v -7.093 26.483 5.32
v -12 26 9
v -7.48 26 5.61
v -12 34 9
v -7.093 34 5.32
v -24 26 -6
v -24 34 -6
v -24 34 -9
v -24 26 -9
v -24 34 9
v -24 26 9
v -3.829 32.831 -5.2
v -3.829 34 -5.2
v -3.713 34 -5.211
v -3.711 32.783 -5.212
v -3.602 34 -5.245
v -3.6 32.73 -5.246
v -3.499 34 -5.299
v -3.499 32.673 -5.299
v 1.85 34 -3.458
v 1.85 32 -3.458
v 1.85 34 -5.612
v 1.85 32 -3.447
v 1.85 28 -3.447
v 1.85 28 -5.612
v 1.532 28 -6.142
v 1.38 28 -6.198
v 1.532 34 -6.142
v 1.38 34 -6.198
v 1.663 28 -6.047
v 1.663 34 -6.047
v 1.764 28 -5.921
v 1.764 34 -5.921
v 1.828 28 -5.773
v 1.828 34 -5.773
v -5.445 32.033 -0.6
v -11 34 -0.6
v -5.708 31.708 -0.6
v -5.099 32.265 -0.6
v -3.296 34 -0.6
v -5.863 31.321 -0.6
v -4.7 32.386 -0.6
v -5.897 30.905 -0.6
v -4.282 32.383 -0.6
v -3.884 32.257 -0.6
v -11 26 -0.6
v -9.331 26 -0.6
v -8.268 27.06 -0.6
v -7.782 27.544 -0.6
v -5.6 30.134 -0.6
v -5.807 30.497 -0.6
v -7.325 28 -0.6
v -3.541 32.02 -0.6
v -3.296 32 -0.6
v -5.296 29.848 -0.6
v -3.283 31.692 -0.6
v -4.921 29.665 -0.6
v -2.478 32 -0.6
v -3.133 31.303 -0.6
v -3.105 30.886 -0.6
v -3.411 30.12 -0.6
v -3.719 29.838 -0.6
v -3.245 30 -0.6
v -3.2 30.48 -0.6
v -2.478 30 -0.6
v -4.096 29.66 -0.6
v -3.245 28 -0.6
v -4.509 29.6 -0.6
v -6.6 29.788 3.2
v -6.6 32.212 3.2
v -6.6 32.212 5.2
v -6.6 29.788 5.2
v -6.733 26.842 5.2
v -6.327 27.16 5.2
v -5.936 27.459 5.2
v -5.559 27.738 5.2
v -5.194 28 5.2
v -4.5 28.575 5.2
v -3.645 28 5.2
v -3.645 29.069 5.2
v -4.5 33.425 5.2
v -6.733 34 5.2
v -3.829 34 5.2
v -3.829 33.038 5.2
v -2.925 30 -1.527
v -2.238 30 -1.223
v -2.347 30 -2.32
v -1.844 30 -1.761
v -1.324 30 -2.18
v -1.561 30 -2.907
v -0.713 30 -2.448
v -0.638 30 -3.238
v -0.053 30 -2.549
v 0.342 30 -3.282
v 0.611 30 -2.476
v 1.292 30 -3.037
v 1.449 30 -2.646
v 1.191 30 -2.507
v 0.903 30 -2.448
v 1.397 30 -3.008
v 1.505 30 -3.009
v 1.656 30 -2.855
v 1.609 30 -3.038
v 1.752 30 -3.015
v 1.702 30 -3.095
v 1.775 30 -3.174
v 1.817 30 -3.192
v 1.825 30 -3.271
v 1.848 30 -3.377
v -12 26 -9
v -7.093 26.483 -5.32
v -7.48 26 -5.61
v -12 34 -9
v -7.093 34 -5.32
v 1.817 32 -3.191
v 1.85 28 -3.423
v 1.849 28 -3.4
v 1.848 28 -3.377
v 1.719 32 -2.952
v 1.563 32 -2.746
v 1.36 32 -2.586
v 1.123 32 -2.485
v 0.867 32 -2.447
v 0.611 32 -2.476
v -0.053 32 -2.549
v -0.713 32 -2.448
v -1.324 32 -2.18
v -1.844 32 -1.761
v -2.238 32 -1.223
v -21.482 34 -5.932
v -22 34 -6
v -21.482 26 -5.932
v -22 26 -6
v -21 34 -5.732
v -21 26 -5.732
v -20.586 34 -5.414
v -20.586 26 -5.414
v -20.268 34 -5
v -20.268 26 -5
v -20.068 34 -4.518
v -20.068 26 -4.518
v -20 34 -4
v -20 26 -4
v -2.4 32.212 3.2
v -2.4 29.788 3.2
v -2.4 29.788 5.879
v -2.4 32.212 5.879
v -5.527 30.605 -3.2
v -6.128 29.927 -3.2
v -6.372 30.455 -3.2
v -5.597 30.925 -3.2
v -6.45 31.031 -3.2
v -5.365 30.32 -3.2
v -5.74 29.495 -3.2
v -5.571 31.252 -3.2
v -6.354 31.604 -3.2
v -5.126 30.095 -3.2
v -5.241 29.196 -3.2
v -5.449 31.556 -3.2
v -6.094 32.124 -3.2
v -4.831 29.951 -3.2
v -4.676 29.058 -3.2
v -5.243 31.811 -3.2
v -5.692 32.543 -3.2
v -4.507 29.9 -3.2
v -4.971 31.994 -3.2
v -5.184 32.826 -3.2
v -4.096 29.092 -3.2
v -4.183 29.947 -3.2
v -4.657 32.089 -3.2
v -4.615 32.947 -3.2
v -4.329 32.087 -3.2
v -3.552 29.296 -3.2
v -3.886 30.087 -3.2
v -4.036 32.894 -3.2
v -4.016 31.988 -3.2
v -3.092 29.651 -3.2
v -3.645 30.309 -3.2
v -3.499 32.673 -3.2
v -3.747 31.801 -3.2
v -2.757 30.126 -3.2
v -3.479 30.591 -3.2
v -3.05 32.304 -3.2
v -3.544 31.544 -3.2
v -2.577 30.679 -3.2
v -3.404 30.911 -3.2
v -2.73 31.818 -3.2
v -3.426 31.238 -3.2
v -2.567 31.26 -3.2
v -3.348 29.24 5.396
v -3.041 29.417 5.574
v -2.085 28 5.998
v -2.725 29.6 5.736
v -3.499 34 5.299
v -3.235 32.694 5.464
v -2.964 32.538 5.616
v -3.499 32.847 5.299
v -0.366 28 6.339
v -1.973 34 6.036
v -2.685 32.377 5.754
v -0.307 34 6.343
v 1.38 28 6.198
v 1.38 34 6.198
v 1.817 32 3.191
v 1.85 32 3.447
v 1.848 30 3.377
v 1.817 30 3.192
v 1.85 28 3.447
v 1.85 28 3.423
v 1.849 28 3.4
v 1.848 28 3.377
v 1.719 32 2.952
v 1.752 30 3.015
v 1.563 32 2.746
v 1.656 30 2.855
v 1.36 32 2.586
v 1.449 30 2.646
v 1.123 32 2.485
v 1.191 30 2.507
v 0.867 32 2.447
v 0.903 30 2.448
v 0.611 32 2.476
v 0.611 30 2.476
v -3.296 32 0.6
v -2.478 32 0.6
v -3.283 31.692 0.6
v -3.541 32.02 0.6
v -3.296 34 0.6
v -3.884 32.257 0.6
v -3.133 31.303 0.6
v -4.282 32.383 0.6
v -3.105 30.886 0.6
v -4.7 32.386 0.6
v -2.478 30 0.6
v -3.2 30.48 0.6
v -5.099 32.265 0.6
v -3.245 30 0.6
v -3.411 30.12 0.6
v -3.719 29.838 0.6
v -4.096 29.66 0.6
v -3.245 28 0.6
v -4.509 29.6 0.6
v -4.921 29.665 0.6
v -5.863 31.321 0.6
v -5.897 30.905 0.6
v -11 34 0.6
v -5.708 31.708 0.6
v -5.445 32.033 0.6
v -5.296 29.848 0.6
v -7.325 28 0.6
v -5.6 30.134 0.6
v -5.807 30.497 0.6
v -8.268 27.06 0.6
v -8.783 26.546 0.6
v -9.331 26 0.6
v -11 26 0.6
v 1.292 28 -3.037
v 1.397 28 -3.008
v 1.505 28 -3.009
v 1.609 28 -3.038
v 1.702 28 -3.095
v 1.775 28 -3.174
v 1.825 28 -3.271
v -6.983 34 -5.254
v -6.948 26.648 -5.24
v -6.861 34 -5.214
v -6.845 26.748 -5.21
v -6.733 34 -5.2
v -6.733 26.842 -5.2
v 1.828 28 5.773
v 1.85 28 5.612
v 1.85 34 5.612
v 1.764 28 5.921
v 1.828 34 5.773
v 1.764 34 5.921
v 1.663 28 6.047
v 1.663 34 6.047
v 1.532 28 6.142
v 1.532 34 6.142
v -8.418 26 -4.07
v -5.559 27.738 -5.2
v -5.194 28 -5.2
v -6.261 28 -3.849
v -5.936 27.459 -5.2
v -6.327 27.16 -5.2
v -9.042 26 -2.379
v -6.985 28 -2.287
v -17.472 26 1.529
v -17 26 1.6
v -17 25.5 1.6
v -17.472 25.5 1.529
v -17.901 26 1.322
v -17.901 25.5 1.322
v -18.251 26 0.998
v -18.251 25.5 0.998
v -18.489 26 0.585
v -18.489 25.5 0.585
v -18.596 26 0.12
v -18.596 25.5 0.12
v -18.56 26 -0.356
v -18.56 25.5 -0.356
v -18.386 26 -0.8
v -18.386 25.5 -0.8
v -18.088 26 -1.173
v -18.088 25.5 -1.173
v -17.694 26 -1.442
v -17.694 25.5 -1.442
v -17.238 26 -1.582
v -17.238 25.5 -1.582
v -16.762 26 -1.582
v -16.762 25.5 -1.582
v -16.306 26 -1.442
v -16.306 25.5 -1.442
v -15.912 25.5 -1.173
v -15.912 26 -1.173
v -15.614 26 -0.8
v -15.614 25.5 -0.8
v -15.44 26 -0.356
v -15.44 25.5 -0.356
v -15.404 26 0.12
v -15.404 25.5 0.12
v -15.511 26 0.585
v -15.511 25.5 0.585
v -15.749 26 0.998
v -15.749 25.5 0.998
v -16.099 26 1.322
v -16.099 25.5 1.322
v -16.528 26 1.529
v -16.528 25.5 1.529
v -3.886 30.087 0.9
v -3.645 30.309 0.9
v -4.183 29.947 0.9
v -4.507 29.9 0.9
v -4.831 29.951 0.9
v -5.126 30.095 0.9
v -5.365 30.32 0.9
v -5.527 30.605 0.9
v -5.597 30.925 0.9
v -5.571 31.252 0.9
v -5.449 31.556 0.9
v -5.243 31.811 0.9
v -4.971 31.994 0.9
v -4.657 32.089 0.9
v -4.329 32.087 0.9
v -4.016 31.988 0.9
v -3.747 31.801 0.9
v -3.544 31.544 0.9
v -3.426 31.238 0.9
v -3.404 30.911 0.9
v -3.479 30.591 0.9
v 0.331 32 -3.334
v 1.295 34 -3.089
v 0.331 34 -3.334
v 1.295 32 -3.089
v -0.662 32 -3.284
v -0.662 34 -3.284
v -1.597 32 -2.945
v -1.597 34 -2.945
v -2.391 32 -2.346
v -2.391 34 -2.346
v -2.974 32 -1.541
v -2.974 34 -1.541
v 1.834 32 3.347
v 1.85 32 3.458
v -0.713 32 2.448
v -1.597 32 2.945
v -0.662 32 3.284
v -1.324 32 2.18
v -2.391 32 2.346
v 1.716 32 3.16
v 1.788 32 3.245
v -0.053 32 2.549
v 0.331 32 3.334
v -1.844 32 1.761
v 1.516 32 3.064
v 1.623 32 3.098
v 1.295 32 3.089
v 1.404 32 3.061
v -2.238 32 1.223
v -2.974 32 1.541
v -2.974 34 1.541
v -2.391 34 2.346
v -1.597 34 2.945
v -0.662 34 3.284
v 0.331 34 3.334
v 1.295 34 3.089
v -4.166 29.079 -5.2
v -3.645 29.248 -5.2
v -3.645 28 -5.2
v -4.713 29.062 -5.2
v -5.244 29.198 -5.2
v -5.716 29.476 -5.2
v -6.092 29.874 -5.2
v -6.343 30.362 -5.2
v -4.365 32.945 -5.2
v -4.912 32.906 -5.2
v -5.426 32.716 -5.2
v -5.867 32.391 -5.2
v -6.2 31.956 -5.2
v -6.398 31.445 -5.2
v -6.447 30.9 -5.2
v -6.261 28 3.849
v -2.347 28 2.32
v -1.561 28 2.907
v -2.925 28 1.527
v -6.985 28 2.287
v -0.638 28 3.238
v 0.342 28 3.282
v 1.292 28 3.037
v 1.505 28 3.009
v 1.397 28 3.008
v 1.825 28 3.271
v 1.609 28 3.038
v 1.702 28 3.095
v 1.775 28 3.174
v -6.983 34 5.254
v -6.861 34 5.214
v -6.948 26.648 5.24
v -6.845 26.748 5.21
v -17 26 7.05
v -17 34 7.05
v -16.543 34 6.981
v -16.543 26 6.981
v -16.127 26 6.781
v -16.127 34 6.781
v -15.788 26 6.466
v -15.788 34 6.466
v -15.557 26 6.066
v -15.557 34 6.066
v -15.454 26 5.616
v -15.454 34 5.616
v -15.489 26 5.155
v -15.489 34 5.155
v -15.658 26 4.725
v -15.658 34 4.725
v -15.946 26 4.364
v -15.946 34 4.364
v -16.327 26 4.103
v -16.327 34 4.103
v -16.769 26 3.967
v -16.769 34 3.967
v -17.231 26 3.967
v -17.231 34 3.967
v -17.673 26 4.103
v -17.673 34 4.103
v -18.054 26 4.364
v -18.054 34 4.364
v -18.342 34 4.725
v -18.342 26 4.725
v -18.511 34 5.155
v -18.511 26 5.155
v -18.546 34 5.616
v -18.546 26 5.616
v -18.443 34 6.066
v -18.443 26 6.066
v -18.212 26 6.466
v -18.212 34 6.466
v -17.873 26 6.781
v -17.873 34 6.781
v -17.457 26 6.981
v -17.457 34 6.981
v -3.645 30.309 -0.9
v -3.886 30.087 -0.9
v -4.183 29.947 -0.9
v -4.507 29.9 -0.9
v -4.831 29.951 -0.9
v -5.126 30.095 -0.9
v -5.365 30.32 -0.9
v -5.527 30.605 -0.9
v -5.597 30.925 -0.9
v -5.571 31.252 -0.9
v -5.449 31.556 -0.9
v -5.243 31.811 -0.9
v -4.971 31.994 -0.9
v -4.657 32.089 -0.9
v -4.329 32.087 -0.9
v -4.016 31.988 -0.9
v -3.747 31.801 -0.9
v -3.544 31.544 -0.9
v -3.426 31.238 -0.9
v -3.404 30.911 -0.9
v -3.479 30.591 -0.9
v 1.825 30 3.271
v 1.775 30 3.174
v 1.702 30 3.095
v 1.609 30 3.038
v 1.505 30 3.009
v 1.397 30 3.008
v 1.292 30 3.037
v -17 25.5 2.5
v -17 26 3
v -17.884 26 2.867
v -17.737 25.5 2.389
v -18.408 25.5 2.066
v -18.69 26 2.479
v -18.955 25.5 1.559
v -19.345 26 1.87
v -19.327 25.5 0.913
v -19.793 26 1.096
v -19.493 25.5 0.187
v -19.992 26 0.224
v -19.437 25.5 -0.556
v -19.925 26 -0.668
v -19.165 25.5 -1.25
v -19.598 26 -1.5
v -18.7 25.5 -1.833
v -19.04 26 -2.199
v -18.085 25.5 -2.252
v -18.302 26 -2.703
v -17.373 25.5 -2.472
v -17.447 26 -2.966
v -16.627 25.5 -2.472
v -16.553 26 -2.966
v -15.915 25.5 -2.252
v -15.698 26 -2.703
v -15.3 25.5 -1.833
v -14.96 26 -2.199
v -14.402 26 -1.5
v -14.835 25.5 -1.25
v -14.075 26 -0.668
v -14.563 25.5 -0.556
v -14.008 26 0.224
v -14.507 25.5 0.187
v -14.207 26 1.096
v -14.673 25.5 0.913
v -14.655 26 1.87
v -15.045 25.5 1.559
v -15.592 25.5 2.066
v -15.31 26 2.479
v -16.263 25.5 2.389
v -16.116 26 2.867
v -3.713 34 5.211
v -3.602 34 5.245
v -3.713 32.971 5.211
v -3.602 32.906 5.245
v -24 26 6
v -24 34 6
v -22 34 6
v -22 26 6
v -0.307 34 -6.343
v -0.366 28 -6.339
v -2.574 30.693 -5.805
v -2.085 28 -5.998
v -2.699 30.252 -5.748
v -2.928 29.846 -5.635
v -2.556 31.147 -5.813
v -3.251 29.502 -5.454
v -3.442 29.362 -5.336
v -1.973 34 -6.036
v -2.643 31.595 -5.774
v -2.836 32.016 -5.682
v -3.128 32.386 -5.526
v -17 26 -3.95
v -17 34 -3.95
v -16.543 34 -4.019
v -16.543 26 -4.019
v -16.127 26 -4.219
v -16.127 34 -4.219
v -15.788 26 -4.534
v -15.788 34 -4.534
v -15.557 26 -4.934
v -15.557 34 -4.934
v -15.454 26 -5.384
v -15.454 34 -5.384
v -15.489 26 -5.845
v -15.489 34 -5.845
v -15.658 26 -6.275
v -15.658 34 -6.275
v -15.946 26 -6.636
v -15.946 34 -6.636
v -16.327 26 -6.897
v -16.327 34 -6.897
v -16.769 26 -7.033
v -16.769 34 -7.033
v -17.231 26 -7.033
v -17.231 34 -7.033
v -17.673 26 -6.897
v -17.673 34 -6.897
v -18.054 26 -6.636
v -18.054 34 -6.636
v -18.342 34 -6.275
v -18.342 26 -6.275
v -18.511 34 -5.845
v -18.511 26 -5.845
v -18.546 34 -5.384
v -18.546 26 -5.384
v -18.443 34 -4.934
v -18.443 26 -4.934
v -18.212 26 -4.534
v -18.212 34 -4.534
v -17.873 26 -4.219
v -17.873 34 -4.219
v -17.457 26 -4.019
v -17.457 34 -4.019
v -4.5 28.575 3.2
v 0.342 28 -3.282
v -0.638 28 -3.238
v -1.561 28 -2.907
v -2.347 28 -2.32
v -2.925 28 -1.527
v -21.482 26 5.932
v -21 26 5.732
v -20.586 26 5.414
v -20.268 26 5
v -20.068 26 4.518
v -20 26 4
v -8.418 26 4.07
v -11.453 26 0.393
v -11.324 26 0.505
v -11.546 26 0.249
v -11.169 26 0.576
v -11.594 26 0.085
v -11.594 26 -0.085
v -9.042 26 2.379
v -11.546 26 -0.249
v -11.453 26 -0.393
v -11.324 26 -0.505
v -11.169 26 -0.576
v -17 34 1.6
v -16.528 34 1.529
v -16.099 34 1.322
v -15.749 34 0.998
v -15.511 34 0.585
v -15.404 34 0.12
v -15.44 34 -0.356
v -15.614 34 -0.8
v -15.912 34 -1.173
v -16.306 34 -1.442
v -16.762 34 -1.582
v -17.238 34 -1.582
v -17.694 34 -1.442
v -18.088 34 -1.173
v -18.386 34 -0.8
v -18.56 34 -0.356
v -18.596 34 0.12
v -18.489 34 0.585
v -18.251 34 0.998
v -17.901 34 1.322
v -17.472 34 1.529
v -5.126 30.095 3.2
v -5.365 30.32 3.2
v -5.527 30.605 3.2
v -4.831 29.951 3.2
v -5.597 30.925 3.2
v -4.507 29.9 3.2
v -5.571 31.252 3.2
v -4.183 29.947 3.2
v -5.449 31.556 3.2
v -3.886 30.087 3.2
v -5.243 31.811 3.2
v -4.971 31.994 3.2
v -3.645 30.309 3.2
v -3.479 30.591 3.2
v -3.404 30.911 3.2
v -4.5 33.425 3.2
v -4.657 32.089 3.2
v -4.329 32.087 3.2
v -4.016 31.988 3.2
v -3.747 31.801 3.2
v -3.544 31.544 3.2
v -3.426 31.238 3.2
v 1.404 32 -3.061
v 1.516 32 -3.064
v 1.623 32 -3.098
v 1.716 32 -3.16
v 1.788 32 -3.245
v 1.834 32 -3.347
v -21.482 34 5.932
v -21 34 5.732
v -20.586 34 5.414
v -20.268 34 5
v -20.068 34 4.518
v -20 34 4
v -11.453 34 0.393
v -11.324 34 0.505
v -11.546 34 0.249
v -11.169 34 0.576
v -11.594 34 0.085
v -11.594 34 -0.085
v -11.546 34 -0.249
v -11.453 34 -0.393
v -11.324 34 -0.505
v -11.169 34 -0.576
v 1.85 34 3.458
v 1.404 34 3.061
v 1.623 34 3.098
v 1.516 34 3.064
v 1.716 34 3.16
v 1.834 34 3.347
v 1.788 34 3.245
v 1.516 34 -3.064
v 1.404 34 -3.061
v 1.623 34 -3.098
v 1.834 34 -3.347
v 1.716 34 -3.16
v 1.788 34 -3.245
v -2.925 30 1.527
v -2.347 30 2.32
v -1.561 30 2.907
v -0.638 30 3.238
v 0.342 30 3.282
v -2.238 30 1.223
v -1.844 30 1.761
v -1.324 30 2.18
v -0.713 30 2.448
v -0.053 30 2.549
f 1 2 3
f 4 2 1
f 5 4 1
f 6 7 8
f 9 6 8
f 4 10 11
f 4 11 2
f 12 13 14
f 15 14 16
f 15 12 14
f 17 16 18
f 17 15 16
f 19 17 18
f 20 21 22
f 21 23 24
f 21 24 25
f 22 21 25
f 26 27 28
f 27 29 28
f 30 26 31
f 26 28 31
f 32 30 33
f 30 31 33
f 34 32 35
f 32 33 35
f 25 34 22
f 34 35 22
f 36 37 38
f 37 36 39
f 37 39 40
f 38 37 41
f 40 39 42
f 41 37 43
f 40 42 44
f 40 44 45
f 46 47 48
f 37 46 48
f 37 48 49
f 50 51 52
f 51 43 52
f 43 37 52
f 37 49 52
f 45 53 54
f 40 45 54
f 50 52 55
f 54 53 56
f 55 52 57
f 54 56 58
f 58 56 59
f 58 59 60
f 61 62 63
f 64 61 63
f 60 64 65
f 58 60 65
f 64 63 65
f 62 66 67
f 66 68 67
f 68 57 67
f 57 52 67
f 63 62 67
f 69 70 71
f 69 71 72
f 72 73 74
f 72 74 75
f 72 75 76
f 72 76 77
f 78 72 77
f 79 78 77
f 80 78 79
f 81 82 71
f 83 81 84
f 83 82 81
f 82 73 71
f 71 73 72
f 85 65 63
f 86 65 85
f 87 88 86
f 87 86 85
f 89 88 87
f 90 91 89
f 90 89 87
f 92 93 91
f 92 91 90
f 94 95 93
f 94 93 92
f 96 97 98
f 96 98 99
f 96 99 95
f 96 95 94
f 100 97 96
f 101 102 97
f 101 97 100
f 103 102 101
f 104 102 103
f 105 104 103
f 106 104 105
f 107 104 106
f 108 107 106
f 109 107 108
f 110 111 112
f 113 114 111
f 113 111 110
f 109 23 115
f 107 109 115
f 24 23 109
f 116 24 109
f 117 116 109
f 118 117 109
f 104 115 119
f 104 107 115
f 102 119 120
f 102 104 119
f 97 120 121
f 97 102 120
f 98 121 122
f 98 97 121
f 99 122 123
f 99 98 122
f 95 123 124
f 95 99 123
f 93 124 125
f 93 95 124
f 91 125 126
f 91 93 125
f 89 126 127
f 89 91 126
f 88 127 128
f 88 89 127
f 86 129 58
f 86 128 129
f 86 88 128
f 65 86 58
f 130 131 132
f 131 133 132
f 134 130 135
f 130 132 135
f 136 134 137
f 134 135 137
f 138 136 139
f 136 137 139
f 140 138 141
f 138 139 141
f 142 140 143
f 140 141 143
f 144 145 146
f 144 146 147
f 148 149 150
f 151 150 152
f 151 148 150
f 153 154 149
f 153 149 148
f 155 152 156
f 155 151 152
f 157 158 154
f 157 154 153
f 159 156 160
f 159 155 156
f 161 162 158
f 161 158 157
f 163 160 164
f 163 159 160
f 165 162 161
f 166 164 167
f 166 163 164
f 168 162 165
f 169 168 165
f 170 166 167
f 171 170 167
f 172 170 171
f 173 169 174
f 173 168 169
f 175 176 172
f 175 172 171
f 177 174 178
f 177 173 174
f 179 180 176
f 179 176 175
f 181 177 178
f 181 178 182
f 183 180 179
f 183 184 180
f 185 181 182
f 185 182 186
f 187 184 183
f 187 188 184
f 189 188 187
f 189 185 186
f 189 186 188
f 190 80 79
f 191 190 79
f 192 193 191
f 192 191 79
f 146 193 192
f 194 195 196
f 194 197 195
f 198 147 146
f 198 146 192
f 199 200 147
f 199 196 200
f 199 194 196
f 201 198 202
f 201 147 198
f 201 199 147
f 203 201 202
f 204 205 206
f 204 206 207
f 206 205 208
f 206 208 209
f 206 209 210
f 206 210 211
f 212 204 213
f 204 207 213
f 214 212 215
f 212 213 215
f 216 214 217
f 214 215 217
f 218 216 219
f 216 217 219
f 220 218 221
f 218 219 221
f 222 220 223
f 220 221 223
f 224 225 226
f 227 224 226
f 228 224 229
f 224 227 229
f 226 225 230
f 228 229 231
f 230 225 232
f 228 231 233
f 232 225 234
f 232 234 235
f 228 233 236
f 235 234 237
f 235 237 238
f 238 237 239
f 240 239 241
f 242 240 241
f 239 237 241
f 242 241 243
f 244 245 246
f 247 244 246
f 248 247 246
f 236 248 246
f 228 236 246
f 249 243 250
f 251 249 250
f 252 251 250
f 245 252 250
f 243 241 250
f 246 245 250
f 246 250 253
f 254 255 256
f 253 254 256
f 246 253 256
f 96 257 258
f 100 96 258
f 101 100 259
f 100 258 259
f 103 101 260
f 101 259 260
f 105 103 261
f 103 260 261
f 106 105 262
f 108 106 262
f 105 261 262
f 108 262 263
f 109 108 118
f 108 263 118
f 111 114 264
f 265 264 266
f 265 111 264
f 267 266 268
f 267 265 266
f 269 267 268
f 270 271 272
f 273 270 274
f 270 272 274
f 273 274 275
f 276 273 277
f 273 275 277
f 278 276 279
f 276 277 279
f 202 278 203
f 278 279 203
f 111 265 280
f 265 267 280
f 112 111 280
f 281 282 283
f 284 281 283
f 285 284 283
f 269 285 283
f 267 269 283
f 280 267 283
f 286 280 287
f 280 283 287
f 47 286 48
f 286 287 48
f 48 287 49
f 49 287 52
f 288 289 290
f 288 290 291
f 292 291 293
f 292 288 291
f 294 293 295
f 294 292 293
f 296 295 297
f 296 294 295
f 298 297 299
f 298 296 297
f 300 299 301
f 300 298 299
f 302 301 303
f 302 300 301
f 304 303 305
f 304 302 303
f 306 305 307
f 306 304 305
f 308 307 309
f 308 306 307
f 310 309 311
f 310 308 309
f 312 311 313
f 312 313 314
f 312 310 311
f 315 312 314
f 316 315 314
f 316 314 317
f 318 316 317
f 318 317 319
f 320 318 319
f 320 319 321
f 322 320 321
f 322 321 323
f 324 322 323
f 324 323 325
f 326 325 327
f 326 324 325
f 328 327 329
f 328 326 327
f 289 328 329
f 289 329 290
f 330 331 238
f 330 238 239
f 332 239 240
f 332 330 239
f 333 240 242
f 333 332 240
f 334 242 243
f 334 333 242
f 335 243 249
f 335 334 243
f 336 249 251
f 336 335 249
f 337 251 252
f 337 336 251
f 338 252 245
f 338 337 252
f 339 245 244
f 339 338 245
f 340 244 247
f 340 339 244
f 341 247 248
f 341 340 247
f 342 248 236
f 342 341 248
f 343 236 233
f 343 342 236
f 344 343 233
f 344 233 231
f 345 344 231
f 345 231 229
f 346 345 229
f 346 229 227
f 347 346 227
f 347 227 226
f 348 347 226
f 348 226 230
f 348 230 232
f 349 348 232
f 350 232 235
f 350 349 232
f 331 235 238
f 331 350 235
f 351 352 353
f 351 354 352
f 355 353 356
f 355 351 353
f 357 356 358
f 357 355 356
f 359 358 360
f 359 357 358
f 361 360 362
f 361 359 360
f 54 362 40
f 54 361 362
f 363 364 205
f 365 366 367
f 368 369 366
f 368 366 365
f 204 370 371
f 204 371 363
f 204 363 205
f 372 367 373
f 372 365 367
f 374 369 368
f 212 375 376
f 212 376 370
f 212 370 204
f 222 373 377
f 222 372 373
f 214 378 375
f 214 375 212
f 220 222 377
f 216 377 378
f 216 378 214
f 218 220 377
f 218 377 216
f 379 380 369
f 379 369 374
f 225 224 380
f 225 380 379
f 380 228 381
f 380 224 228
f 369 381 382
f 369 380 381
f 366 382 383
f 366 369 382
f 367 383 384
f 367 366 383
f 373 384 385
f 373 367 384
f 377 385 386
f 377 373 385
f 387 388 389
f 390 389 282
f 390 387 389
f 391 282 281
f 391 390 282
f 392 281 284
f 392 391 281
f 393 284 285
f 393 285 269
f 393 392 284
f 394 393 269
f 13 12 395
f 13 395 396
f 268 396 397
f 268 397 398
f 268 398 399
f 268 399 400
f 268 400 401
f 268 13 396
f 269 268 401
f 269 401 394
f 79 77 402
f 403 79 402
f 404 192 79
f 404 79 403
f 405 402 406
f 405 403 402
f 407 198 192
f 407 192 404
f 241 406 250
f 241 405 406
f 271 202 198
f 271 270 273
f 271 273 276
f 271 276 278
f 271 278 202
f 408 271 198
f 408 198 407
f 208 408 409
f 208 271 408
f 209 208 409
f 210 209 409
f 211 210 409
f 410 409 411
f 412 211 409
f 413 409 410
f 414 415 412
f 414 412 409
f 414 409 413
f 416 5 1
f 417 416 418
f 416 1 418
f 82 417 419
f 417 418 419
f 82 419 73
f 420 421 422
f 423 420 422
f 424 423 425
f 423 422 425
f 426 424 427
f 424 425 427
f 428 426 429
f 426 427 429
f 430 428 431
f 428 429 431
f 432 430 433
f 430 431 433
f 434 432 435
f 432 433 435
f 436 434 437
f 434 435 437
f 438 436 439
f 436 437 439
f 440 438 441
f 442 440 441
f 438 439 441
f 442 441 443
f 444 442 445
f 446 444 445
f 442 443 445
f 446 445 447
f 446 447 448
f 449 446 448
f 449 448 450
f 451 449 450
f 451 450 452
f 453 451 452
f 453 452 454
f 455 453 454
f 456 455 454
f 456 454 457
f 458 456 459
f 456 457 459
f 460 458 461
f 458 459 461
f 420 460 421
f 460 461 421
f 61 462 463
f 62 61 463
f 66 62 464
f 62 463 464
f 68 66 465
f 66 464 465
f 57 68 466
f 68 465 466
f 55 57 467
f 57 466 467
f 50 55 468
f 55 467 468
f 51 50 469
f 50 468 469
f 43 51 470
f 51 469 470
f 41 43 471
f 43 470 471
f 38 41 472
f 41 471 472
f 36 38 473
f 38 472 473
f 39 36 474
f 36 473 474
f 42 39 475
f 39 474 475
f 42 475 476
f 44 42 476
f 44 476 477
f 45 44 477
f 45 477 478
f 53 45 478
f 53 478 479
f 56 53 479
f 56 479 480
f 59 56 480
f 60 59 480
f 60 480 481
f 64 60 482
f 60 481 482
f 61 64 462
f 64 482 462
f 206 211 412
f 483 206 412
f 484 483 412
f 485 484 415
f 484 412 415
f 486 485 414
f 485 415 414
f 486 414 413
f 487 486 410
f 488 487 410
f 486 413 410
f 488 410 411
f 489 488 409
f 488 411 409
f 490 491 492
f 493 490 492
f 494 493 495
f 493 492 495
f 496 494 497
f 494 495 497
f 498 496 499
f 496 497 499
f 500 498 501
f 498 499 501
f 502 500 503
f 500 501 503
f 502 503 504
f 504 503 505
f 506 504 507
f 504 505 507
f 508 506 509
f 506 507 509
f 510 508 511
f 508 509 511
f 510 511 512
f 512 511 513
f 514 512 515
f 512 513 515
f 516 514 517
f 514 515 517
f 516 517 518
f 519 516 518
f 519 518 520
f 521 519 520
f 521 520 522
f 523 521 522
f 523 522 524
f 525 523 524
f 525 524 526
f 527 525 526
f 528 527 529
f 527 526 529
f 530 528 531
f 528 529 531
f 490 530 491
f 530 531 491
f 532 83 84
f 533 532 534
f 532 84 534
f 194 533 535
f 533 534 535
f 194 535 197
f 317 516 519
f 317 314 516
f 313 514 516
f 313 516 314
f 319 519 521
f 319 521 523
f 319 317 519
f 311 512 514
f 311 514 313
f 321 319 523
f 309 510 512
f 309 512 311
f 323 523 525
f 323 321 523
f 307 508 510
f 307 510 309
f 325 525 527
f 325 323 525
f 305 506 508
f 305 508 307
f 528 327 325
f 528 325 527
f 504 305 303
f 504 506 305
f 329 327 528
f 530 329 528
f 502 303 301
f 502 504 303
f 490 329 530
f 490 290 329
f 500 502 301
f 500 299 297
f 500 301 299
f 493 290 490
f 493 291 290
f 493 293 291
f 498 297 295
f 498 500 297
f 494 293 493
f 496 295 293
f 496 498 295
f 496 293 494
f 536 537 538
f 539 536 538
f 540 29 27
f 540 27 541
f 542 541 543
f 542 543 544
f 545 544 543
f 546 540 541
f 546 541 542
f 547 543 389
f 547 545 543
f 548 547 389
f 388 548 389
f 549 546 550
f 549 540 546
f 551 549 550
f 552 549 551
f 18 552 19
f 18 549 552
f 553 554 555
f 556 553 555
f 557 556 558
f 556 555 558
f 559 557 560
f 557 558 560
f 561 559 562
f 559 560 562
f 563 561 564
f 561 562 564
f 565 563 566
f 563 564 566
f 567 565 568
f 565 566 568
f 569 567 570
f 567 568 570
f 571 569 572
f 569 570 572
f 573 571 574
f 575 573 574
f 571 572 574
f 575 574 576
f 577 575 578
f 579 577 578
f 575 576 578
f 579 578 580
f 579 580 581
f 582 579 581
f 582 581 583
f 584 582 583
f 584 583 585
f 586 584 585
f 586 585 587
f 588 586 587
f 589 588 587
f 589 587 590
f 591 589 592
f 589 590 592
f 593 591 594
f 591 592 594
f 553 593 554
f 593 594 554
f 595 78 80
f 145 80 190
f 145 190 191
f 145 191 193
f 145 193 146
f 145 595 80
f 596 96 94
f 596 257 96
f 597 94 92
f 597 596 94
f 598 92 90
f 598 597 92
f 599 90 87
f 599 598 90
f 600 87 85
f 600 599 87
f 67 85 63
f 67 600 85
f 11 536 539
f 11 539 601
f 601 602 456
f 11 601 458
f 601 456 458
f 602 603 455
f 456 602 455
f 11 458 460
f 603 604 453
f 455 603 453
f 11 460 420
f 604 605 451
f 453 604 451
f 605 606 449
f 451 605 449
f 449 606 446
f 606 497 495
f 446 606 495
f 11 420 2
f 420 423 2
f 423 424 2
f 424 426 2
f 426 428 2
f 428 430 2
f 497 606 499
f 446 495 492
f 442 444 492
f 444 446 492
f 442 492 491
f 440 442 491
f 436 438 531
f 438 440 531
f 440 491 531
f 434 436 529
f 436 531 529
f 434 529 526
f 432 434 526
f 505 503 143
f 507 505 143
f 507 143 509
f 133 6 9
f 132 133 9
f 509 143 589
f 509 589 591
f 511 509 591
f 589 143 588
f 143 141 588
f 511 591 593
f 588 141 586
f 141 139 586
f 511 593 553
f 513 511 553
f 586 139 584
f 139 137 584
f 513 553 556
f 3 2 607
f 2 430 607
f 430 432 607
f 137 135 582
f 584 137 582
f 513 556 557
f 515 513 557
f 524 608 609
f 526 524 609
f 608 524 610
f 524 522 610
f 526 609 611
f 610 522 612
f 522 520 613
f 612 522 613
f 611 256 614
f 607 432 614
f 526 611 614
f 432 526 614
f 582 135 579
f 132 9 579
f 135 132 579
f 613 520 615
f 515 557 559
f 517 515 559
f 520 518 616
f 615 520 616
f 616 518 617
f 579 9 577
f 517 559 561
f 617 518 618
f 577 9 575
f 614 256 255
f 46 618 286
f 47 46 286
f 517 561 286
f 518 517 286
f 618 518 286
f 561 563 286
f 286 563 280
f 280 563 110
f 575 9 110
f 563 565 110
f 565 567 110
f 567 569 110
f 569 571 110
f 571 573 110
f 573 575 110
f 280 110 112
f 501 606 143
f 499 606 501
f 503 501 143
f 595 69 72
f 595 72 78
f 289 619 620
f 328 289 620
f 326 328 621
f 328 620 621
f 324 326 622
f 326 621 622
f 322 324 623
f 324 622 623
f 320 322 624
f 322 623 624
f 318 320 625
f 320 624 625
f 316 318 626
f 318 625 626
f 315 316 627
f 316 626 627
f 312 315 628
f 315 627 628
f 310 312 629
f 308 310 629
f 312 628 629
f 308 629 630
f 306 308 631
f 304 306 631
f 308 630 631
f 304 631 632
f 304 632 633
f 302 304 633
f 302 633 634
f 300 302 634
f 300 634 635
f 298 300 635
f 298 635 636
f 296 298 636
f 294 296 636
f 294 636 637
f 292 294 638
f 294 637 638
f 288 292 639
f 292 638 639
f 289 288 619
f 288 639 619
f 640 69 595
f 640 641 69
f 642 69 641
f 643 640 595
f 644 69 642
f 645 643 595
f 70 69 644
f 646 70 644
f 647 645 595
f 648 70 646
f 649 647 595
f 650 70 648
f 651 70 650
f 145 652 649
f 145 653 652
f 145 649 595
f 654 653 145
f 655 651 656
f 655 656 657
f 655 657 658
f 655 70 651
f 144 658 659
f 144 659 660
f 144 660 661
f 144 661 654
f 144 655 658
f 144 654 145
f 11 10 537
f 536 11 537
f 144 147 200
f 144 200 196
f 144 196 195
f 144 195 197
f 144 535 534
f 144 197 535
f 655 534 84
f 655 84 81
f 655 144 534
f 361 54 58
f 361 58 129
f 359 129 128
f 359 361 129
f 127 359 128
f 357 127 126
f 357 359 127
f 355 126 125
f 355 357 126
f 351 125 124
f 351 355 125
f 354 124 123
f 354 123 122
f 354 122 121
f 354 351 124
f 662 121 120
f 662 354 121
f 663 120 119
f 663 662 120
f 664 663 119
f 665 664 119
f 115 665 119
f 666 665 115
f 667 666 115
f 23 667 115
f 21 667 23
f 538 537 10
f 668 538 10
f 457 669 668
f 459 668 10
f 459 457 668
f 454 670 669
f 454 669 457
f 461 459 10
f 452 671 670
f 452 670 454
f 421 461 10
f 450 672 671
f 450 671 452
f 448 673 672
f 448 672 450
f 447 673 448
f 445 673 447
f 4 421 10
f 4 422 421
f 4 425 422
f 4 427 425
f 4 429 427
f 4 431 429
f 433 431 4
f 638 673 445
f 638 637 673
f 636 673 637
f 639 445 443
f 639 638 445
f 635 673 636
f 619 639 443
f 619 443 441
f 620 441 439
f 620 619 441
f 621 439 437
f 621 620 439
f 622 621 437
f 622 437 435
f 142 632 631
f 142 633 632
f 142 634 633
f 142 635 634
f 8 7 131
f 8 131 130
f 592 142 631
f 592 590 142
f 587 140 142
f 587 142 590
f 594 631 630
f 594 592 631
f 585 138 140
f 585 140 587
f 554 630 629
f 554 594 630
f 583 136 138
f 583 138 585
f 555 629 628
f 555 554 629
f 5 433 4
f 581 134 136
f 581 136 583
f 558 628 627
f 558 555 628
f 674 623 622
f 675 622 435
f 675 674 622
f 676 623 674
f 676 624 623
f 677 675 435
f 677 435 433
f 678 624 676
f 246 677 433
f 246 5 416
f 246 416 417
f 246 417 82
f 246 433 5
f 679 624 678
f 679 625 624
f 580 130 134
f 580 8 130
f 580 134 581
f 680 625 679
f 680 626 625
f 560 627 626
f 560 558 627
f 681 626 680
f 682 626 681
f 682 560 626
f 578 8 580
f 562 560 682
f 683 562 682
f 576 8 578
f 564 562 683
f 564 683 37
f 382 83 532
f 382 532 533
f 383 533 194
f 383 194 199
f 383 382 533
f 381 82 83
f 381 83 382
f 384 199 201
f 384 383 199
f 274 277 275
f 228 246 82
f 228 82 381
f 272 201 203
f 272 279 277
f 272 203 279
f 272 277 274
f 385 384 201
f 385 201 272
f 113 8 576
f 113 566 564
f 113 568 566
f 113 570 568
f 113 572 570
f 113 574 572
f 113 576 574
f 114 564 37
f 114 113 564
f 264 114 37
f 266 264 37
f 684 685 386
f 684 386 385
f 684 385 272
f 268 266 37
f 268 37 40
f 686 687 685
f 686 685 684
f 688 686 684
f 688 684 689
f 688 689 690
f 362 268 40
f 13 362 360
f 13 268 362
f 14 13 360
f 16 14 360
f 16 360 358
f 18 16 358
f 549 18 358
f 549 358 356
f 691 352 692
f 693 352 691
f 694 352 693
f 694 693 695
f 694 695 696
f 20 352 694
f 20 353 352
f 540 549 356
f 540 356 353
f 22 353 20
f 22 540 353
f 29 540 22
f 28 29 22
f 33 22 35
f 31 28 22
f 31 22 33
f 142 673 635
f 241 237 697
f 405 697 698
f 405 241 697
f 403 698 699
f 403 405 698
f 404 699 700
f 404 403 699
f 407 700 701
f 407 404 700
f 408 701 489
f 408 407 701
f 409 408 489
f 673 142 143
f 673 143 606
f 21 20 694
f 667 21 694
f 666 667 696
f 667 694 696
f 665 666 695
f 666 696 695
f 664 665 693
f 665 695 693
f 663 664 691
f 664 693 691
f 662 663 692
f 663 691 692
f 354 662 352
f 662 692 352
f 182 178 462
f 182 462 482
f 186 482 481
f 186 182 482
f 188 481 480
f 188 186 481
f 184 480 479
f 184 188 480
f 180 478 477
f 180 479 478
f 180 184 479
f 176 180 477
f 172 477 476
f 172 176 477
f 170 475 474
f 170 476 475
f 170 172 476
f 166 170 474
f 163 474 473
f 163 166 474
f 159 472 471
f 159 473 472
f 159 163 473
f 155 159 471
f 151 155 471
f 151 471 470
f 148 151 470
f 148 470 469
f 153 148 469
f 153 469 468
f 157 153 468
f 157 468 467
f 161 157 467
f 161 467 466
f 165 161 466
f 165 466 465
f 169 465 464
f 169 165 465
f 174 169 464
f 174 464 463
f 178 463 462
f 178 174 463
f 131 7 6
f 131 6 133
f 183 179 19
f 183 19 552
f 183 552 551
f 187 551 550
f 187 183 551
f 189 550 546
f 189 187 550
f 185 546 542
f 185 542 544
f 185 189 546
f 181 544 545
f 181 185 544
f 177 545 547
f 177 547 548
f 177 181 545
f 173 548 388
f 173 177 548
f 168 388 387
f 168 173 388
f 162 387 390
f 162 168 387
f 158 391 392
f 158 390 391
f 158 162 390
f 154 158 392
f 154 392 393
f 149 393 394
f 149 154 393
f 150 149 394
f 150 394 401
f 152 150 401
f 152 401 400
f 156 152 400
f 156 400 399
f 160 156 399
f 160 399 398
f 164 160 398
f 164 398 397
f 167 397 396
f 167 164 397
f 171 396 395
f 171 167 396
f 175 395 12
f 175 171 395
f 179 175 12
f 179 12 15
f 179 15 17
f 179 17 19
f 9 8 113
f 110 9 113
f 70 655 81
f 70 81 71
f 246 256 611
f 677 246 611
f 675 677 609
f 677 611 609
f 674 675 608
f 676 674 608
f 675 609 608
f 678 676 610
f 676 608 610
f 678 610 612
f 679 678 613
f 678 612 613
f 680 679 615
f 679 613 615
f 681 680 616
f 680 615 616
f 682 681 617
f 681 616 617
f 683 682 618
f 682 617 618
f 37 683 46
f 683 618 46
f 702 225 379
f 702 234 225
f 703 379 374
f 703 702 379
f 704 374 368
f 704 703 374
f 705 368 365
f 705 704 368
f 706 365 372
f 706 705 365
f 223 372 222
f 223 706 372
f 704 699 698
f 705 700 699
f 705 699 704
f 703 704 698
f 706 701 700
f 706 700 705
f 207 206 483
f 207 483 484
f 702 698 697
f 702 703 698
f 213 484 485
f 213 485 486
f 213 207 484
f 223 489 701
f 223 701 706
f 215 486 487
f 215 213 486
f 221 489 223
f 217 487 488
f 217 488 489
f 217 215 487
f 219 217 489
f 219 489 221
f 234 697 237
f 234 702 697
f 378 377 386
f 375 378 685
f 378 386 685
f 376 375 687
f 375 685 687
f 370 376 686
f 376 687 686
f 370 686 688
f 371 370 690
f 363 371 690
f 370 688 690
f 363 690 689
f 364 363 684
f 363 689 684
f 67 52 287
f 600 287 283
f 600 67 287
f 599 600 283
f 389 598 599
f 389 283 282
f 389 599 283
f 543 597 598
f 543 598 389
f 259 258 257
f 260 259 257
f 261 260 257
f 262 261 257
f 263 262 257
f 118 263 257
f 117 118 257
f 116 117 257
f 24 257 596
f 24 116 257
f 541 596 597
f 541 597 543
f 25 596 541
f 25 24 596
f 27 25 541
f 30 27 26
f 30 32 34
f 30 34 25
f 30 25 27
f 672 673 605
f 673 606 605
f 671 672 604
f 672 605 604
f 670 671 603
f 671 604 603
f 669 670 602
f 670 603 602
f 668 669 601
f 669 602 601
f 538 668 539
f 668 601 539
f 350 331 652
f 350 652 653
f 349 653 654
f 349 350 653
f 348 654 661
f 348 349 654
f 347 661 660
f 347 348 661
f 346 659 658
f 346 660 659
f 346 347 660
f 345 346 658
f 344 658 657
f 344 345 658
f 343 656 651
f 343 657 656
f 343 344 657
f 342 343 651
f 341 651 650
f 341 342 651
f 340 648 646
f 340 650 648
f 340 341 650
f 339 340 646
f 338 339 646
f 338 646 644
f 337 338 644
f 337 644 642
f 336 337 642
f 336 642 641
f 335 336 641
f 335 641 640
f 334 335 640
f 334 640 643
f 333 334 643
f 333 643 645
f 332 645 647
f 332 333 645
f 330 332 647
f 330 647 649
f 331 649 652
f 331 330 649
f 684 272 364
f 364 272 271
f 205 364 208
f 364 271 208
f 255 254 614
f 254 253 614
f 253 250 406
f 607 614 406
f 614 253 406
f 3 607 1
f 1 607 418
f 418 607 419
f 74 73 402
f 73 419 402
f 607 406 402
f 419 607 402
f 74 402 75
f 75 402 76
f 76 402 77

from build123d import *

# Parameters (mm, degrees)
SKETCH2_W               = 4
SKETCH2_H               = 3
SKETCH2_R               = 1.55
SKETCH2_R_2             = 1.6
BOSS_EXTRUDE1_DEPTH     = 8
SKETCH3_W               = 8.237002406
SKETCH3_H               = 20.610649192
CUT_EXTRUDE1_DEPTH      = 43.579337712
CHAMFER1_SIZE           = 3
FILLET4_R               = 1
FILLET5_R               = 0.4
FILLET6_R               = 2
CUT_EXTRUDE2_DEPTH      = 43.579337712
SKETCH7_R               = 2.5
SKETCH7_R_2             = 1.6
BOSS_EXTRUDE2_DEPTH     = 0.5
CHAMFER2_SIZE           = 0.5
CUT_EXTRUDE4_DEPTH      = 43.579337712
CUT_EXTRUDE4_DEPTH_BACK = 43.579337712
SKETCH8_R               = 1.1
FILLET7_R               = 0.6
CHAMFER3_SIZE           = 0.3
CUT_EXTRUDE5_DEPTH      = 1.2
CUT_EXTRUDE5_DEPTH_BACK = 2
CUT_EXTRUDE6_DEPTH      = 10
CUT_EXTRUDE6_DEPTH_BACK = 2
SKETCH11_R              = 1.95


# Some blends are built 0.0001 mm under size
with BuildPart() as part:
    # Sketch1 → Revolve1 (revolve)
    with BuildSketch(Plane.XY, mode=Mode.PRIVATE) as revolve1_sk:
        Polygon((-3.35, 34), (-3.35, 32), (-2.55, 32), (-2.55, 30), (-3.3, 30), (-3.3, 28), (-6.35, 28), (-6.35, 34), align=None)
    revolve(revolve1_sk.sketch.rotate(Axis((0, 0, 0), (0, 1, 0)), 270), axis=Axis((0, 0, 0), (0, 1, 0)))

    # Sketch2 → Boss-Extrude1 (add)
    # profile 1 of 6: a face of its own
    with BuildSketch(Plane(origin=(0, 34, 0), x_dir=(1, 0, 0), z_dir=(0, 1, 0))):
        with Locations((-22, 7.5)):
            Rectangle(SKETCH2_W, SKETCH2_H)
    # profile 2 of 6: a face of its own
    with BuildSketch(Plane(origin=(0, 34, 0), x_dir=(1, 0, 0), z_dir=(0, 1, 0))):
        with Locations((-22, -7.5)):
            Rectangle(SKETCH2_W, SKETCH2_H)
    # profile 3 of 6: a face of its own
    with BuildSketch(Plane(origin=(0, 34, 0), x_dir=(1, 0, 0), z_dir=(0, 1, 0))):
        Polygon((-12, 9), (-20, 9), (-20, 6), (-20, -6), (-20, -9), (-12, -9), (-6.933333333, -5.2), (-8.990544831, -5.2), (-8.990544831, 5.2), (-6.933333333, 5.2), align=None)
        with Locations(Location((-17, -5.5, 0), (0, 0, 270))):
            Circle(SKETCH2_R, mode=Mode.SUBTRACT)
        with Locations(Location((-17, 0, 0), (0, 0, 270))):
            Circle(SKETCH2_R_2, mode=Mode.SUBTRACT)
        with Locations(Location((-17, 5.5, 0), (0, 0, 270))):
            Circle(SKETCH2_R, mode=Mode.SUBTRACT)
    # profile 4 of 6: a face of its own
    with BuildSketch(Plane(origin=(0, 34, 0), x_dir=(1, 0, 0), z_dir=(0, 1, 0))):
        with BuildLine():
            Line((-5.08, 3.81), (-6.933333333, 5.2))
            Line((-6.933333333, 5.2), (-8.990544831, 5.2))
            Line((-8.990544831, 5.2), (-8.990544831, -5.2))
            Line((-8.990544831, -5.2), (-6.933333333, -5.2))
            Line((-6.933333333, -5.2), (-5.08, -3.81))
            ThreePointArc((-5.08, -3.81), (-6.35, 0), (-5.08, 3.81))
        make_face()
    # profile 5 of 6: a face of its own
    with BuildSketch(Plane(origin=(0, 34, 0), x_dir=(1, 0, 0), z_dir=(0, 1, 0))):
        with BuildLine():
            Line((-3.644516429, 5.2), (-6.933333333, 5.2))
            Line((-6.933333333, 5.2), (-5.08, 3.81))
            ThreePointArc((-5.08, 3.81), (-4.417275374, 4.561817431), (-3.644516429, 5.2))
        make_face()
    # profile 6 of 6: a face of its own
    with BuildSketch(Plane(origin=(0, 34, 0), x_dir=(1, 0, 0), z_dir=(0, 1, 0))):
        with BuildLine():
            ThreePointArc((-3.644516429, -5.2), (-4.417275374, -4.561817431), (-5.08, -3.81))
            Line((-5.08, -3.81), (-6.933333333, -5.2))
            Line((-6.933333333, -5.2), (-3.644516429, -5.2))
        make_face()
    extrude(amount=-BOSS_EXTRUDE1_DEPTH)

    # Sketch3 → Cut-Extrude1 (cut, through all)
    with BuildSketch(Plane(origin=(0, 0, 0), x_dir=(1, 0, 0), z_dir=(0, 1, 0))):
        with Locations((5.968501203, -0.12700224)):
            Rectangle(SKETCH3_W, SKETCH3_H)
    extrude(amount=CUT_EXTRUDE1_DEPTH, mode=Mode.SUBTRACT)

    # Chamfer1
    # the kernel refuses this chamfer: 3 mm, written as the material it adds along each edge
    # the kernel refuses this chamfer: 3 mm, written as the material it takes off along each edge
    with BuildSketch(Plane(origin=(0, 26, 0), x_dir=(0.568258769278242, 0, -0.8228499080259886), z_dir=(0.8228499080259886, 0, 0.568258769278242))) as chamfer1_2_piece_1_section:
        Polygon((6.35 + CHAMFER1_SIZE, 0), (6.35, CHAMFER1_SIZE), (6.35, 0), align=None)
    chamfer1_2_piece_1 = revolve(axis=Axis((0, 26, 0), (0, 1, 0)), revolution_arc=249.257786961, mode=Mode.PRIVATE)
    chamfer1_2_piece_1 = split(chamfer1_2_piece_1, bisect_by=Plane(origin=(-8.355666821, 28, 0), z_dir=(0, -1, 0)), keep=Keep.TOP, mode=Mode.PRIVATE)
    add(chamfer1_2_piece_1, mode=Mode.SUBTRACT)

    # Fillet4
    fillet4_edges = [part.edges().sort_by_distance(p)[0] for p in [
        (1.85, 31, 1.754992877),
        (1.85, 31, -1.754992877),
    ]]
    fillet(fillet4_edges, radius=FILLET4_R)

    # Fillet5
    # the kernel refuses this fillet: 0.4 mm, written as the material it takes off along each edge
    with BuildSketch(Plane(origin=(1.684476075, 35.466182436, -2.895693415), x_dir=(-0.8951889914868396, 0, -0.4456867392247326), z_dir=(0, -1, 0))) as fillet5_piece_1:
        with BuildLine():
            CenterArc((0.460657077, 0.399157196), FILLET5_R, 153.532715484, 112.747248008)
            Line((0.10258148, 0.577431892), (0.06677392, 0.595259361))
            ThreePointArc((0.06677392, 0.595259361), (0.061610325, 0.584887966), (-0.039704275, -0.00485495))
            Line((-0.039704275, -0.00485495), (0.002595251, -0.03991572))
            ThreePointArc((0.002595251, -0.03991572), (0.217352283, -0.032941517), (0.432109314, -0.03991572))
            Line((0.432109314, -0.03991572), (0.434704565, 0))
        make_face()
    extrude(amount=3.466182436, mode=Mode.SUBTRACT)
    with BuildSketch(Plane(origin=(1.655788422, 26.609524103, -2.85453406), x_dir=(0.3447573093533237, 0, -0.938691854469536), z_dir=(0, 1, 0))) as fillet5_piece_2:
        with BuildLine():
            CenterArc((0.444952287, 0.384221409), FILLET5_R, 177.1195622, 109.026989702)
            ThreePointArc((0.045457658, 0.404322189), (0.028966063, 0.201459847), (0, 0))
            ThreePointArc((0, 0), (0.278095179, -0.039446477), (0.556190359, 0))
        make_face()
    extrude(amount=3.390475897, mode=Mode.SUBTRACT)
    with BuildSketch(Plane(origin=(1.655788422, 26.609524103, 2.85453406), x_dir=(0.3447573093533235, 0, 0.9386918544695363), z_dir=(0, 1, 0))) as fillet5_piece_3:
        with BuildLine():
            CenterArc((0.444952287, -0.384221409), FILLET5_R, 73.853448098, 109.026989702)
            ThreePointArc((0.045457658, -0.404322189), (0.028966063, -0.201459847), (0, 0))
            ThreePointArc((0, 0), (0.278095179, 0.039446477), (0.556190359, 0))
        make_face()
    extrude(amount=3.390475897, mode=Mode.SUBTRACT)
    with BuildSketch(Plane(origin=(1.684476075, 35.466182436, 2.895693415), x_dir=(-0.8951889914868395, 0, 0.44568673922473334), z_dir=(0, -1, 0))) as fillet5_piece_4:
        with BuildLine():
            CenterArc((0.460657077, -0.399157196), FILLET5_R, 93.720036508, 112.747248008)
            Line((0.10258148, -0.577431892), (0.06677392, -0.595259361))
            ThreePointArc((0.06677392, -0.595259361), (0.061610325, -0.584887966), (-0.039704275, 0.00485495))
            Line((-0.039704275, 0.00485495), (0.002595251, 0.03991572))
            ThreePointArc((0.002595251, 0.03991572), (0.217352283, 0.032941517), (0.432109314, 0.03991572))
            Line((0.432109314, 0.03991572), (0.434704565, 0))
        make_face()
    extrude(amount=3.466182436, mode=Mode.SUBTRACT)

    # Fillet6
    fillet6_edges = [part.edges().sort_by_distance(p)[0] for p in [
        (-20, 30, 6),
        (-20, 30, -6),
    ]]
    fillet(fillet6_edges, radius=FILLET6_R)

    # Sketch5 → Cut-Extrude2 (cut, through all)
    with BuildSketch(Plane(origin=(0, 0, 0), x_dir=(1, 0, 0), z_dir=(0, 1, 0))):
        with BuildLine():
            Line((0, -0.6), (-11, -0.6))
            ThreePointArc((-11, -0.6), (-11.6, 0), (-11, 0.6))
            Line((-11, 0.6), (0, 0.6))
            ThreePointArc((0, 0.6), (0.6, 0), (0, -0.6))
        make_face()
    extrude(amount=CUT_EXTRUDE2_DEPTH, mode=Mode.SUBTRACT)

    # Sketch7 → Boss-Extrude2 (add)
    with BuildSketch(Plane.XZ.offset(-26)):
        with Locations(Location((-17, 0, 0), (0, 0, 90))):
            Circle(SKETCH7_R)
        with Locations(Location((-17, 0, 0), (0, 0, 90))):
            Circle(SKETCH7_R_2, mode=Mode.SUBTRACT)
    extrude(amount=BOSS_EXTRUDE2_DEPTH)

    # Chamfer2
    chamfer2_edges = [part.edges().sort_by_distance(p)[0] for p in [
        (-17, 26, -2.5),
    ]]
    chamfer(chamfer2_edges, length=CHAMFER2_SIZE - 0.0001)  # a hair under: the kernel refuses the full size

    # Sketch8 → Cut-Extrude4 (cut, two sides: drawn at the far end of the back side and taken through both)
    with BuildSketch(Plane.XY.offset(-CUT_EXTRUDE4_DEPTH_BACK)):
        with Locations(Location((-4.5, 31, 0), (0, 0, 321.051593768))):
            Circle(SKETCH8_R)
    extrude(amount=CUT_EXTRUDE4_DEPTH + CUT_EXTRUDE4_DEPTH_BACK, mode=Mode.SUBTRACT)

    # Fillet7
    fillet7_edges = [part.edges().sort_by_distance(p)[0] for p in [
        (-3.644516429, 32.845741182, 5.2),
        (-3.644516429, 32.845741182, -5.2),
        (1.85, 31, 6.074537019),
        (1.85, 31, -6.074537019),
        (-6.933333333, 30.341666667, 5.2),
        (-6.933333333, 30.341666667, -5.2),
    ]]
    fillet(fillet7_edges, radius=FILLET7_R)

    # Chamfer3
    chamfer3_edges = [part.edges().sort_by_distance(p)[0] for p in [
        (-5.355483571, 31.691482364, 0.6),
        (-5.355483571, 31.691482364, -0.6),
    ]]
    chamfer(chamfer3_edges, length=CHAMFER3_SIZE)

    # Sketch10 → Cut-Extrude5 (cut, two sides: drawn at the far end of the back side and taken through both)
    with BuildSketch(Plane.XY.offset(5.2).offset(-CUT_EXTRUDE5_DEPTH_BACK)):
        Polygon((-4.5, 28.575128869), (-2.4, 29.787564435), (-2.4, 32.212435565), (-4.5, 33.424871131), (-6.6, 32.212435565), (-6.6, 29.787564435), align=None)
    extrude(amount=CUT_EXTRUDE5_DEPTH + CUT_EXTRUDE5_DEPTH_BACK, mode=Mode.SUBTRACT)

    # Sketch11 → Cut-Extrude6 (cut, two sides: drawn at the far end of the back side and taken through both)
    with BuildSketch(Plane(origin=(0, 0, -5.2), x_dir=(-1, 0, 0), z_dir=(0, 0, -1)).offset(-CUT_EXTRUDE6_DEPTH_BACK)):
        with Locations(Location((4.5, 31, 0), (0, 0, 120.900188268))):
            Circle(SKETCH11_R)
    extrude(amount=CUT_EXTRUDE6_DEPTH + CUT_EXTRUDE6_DEPTH_BACK, mode=Mode.SUBTRACT)


solid = part.part
